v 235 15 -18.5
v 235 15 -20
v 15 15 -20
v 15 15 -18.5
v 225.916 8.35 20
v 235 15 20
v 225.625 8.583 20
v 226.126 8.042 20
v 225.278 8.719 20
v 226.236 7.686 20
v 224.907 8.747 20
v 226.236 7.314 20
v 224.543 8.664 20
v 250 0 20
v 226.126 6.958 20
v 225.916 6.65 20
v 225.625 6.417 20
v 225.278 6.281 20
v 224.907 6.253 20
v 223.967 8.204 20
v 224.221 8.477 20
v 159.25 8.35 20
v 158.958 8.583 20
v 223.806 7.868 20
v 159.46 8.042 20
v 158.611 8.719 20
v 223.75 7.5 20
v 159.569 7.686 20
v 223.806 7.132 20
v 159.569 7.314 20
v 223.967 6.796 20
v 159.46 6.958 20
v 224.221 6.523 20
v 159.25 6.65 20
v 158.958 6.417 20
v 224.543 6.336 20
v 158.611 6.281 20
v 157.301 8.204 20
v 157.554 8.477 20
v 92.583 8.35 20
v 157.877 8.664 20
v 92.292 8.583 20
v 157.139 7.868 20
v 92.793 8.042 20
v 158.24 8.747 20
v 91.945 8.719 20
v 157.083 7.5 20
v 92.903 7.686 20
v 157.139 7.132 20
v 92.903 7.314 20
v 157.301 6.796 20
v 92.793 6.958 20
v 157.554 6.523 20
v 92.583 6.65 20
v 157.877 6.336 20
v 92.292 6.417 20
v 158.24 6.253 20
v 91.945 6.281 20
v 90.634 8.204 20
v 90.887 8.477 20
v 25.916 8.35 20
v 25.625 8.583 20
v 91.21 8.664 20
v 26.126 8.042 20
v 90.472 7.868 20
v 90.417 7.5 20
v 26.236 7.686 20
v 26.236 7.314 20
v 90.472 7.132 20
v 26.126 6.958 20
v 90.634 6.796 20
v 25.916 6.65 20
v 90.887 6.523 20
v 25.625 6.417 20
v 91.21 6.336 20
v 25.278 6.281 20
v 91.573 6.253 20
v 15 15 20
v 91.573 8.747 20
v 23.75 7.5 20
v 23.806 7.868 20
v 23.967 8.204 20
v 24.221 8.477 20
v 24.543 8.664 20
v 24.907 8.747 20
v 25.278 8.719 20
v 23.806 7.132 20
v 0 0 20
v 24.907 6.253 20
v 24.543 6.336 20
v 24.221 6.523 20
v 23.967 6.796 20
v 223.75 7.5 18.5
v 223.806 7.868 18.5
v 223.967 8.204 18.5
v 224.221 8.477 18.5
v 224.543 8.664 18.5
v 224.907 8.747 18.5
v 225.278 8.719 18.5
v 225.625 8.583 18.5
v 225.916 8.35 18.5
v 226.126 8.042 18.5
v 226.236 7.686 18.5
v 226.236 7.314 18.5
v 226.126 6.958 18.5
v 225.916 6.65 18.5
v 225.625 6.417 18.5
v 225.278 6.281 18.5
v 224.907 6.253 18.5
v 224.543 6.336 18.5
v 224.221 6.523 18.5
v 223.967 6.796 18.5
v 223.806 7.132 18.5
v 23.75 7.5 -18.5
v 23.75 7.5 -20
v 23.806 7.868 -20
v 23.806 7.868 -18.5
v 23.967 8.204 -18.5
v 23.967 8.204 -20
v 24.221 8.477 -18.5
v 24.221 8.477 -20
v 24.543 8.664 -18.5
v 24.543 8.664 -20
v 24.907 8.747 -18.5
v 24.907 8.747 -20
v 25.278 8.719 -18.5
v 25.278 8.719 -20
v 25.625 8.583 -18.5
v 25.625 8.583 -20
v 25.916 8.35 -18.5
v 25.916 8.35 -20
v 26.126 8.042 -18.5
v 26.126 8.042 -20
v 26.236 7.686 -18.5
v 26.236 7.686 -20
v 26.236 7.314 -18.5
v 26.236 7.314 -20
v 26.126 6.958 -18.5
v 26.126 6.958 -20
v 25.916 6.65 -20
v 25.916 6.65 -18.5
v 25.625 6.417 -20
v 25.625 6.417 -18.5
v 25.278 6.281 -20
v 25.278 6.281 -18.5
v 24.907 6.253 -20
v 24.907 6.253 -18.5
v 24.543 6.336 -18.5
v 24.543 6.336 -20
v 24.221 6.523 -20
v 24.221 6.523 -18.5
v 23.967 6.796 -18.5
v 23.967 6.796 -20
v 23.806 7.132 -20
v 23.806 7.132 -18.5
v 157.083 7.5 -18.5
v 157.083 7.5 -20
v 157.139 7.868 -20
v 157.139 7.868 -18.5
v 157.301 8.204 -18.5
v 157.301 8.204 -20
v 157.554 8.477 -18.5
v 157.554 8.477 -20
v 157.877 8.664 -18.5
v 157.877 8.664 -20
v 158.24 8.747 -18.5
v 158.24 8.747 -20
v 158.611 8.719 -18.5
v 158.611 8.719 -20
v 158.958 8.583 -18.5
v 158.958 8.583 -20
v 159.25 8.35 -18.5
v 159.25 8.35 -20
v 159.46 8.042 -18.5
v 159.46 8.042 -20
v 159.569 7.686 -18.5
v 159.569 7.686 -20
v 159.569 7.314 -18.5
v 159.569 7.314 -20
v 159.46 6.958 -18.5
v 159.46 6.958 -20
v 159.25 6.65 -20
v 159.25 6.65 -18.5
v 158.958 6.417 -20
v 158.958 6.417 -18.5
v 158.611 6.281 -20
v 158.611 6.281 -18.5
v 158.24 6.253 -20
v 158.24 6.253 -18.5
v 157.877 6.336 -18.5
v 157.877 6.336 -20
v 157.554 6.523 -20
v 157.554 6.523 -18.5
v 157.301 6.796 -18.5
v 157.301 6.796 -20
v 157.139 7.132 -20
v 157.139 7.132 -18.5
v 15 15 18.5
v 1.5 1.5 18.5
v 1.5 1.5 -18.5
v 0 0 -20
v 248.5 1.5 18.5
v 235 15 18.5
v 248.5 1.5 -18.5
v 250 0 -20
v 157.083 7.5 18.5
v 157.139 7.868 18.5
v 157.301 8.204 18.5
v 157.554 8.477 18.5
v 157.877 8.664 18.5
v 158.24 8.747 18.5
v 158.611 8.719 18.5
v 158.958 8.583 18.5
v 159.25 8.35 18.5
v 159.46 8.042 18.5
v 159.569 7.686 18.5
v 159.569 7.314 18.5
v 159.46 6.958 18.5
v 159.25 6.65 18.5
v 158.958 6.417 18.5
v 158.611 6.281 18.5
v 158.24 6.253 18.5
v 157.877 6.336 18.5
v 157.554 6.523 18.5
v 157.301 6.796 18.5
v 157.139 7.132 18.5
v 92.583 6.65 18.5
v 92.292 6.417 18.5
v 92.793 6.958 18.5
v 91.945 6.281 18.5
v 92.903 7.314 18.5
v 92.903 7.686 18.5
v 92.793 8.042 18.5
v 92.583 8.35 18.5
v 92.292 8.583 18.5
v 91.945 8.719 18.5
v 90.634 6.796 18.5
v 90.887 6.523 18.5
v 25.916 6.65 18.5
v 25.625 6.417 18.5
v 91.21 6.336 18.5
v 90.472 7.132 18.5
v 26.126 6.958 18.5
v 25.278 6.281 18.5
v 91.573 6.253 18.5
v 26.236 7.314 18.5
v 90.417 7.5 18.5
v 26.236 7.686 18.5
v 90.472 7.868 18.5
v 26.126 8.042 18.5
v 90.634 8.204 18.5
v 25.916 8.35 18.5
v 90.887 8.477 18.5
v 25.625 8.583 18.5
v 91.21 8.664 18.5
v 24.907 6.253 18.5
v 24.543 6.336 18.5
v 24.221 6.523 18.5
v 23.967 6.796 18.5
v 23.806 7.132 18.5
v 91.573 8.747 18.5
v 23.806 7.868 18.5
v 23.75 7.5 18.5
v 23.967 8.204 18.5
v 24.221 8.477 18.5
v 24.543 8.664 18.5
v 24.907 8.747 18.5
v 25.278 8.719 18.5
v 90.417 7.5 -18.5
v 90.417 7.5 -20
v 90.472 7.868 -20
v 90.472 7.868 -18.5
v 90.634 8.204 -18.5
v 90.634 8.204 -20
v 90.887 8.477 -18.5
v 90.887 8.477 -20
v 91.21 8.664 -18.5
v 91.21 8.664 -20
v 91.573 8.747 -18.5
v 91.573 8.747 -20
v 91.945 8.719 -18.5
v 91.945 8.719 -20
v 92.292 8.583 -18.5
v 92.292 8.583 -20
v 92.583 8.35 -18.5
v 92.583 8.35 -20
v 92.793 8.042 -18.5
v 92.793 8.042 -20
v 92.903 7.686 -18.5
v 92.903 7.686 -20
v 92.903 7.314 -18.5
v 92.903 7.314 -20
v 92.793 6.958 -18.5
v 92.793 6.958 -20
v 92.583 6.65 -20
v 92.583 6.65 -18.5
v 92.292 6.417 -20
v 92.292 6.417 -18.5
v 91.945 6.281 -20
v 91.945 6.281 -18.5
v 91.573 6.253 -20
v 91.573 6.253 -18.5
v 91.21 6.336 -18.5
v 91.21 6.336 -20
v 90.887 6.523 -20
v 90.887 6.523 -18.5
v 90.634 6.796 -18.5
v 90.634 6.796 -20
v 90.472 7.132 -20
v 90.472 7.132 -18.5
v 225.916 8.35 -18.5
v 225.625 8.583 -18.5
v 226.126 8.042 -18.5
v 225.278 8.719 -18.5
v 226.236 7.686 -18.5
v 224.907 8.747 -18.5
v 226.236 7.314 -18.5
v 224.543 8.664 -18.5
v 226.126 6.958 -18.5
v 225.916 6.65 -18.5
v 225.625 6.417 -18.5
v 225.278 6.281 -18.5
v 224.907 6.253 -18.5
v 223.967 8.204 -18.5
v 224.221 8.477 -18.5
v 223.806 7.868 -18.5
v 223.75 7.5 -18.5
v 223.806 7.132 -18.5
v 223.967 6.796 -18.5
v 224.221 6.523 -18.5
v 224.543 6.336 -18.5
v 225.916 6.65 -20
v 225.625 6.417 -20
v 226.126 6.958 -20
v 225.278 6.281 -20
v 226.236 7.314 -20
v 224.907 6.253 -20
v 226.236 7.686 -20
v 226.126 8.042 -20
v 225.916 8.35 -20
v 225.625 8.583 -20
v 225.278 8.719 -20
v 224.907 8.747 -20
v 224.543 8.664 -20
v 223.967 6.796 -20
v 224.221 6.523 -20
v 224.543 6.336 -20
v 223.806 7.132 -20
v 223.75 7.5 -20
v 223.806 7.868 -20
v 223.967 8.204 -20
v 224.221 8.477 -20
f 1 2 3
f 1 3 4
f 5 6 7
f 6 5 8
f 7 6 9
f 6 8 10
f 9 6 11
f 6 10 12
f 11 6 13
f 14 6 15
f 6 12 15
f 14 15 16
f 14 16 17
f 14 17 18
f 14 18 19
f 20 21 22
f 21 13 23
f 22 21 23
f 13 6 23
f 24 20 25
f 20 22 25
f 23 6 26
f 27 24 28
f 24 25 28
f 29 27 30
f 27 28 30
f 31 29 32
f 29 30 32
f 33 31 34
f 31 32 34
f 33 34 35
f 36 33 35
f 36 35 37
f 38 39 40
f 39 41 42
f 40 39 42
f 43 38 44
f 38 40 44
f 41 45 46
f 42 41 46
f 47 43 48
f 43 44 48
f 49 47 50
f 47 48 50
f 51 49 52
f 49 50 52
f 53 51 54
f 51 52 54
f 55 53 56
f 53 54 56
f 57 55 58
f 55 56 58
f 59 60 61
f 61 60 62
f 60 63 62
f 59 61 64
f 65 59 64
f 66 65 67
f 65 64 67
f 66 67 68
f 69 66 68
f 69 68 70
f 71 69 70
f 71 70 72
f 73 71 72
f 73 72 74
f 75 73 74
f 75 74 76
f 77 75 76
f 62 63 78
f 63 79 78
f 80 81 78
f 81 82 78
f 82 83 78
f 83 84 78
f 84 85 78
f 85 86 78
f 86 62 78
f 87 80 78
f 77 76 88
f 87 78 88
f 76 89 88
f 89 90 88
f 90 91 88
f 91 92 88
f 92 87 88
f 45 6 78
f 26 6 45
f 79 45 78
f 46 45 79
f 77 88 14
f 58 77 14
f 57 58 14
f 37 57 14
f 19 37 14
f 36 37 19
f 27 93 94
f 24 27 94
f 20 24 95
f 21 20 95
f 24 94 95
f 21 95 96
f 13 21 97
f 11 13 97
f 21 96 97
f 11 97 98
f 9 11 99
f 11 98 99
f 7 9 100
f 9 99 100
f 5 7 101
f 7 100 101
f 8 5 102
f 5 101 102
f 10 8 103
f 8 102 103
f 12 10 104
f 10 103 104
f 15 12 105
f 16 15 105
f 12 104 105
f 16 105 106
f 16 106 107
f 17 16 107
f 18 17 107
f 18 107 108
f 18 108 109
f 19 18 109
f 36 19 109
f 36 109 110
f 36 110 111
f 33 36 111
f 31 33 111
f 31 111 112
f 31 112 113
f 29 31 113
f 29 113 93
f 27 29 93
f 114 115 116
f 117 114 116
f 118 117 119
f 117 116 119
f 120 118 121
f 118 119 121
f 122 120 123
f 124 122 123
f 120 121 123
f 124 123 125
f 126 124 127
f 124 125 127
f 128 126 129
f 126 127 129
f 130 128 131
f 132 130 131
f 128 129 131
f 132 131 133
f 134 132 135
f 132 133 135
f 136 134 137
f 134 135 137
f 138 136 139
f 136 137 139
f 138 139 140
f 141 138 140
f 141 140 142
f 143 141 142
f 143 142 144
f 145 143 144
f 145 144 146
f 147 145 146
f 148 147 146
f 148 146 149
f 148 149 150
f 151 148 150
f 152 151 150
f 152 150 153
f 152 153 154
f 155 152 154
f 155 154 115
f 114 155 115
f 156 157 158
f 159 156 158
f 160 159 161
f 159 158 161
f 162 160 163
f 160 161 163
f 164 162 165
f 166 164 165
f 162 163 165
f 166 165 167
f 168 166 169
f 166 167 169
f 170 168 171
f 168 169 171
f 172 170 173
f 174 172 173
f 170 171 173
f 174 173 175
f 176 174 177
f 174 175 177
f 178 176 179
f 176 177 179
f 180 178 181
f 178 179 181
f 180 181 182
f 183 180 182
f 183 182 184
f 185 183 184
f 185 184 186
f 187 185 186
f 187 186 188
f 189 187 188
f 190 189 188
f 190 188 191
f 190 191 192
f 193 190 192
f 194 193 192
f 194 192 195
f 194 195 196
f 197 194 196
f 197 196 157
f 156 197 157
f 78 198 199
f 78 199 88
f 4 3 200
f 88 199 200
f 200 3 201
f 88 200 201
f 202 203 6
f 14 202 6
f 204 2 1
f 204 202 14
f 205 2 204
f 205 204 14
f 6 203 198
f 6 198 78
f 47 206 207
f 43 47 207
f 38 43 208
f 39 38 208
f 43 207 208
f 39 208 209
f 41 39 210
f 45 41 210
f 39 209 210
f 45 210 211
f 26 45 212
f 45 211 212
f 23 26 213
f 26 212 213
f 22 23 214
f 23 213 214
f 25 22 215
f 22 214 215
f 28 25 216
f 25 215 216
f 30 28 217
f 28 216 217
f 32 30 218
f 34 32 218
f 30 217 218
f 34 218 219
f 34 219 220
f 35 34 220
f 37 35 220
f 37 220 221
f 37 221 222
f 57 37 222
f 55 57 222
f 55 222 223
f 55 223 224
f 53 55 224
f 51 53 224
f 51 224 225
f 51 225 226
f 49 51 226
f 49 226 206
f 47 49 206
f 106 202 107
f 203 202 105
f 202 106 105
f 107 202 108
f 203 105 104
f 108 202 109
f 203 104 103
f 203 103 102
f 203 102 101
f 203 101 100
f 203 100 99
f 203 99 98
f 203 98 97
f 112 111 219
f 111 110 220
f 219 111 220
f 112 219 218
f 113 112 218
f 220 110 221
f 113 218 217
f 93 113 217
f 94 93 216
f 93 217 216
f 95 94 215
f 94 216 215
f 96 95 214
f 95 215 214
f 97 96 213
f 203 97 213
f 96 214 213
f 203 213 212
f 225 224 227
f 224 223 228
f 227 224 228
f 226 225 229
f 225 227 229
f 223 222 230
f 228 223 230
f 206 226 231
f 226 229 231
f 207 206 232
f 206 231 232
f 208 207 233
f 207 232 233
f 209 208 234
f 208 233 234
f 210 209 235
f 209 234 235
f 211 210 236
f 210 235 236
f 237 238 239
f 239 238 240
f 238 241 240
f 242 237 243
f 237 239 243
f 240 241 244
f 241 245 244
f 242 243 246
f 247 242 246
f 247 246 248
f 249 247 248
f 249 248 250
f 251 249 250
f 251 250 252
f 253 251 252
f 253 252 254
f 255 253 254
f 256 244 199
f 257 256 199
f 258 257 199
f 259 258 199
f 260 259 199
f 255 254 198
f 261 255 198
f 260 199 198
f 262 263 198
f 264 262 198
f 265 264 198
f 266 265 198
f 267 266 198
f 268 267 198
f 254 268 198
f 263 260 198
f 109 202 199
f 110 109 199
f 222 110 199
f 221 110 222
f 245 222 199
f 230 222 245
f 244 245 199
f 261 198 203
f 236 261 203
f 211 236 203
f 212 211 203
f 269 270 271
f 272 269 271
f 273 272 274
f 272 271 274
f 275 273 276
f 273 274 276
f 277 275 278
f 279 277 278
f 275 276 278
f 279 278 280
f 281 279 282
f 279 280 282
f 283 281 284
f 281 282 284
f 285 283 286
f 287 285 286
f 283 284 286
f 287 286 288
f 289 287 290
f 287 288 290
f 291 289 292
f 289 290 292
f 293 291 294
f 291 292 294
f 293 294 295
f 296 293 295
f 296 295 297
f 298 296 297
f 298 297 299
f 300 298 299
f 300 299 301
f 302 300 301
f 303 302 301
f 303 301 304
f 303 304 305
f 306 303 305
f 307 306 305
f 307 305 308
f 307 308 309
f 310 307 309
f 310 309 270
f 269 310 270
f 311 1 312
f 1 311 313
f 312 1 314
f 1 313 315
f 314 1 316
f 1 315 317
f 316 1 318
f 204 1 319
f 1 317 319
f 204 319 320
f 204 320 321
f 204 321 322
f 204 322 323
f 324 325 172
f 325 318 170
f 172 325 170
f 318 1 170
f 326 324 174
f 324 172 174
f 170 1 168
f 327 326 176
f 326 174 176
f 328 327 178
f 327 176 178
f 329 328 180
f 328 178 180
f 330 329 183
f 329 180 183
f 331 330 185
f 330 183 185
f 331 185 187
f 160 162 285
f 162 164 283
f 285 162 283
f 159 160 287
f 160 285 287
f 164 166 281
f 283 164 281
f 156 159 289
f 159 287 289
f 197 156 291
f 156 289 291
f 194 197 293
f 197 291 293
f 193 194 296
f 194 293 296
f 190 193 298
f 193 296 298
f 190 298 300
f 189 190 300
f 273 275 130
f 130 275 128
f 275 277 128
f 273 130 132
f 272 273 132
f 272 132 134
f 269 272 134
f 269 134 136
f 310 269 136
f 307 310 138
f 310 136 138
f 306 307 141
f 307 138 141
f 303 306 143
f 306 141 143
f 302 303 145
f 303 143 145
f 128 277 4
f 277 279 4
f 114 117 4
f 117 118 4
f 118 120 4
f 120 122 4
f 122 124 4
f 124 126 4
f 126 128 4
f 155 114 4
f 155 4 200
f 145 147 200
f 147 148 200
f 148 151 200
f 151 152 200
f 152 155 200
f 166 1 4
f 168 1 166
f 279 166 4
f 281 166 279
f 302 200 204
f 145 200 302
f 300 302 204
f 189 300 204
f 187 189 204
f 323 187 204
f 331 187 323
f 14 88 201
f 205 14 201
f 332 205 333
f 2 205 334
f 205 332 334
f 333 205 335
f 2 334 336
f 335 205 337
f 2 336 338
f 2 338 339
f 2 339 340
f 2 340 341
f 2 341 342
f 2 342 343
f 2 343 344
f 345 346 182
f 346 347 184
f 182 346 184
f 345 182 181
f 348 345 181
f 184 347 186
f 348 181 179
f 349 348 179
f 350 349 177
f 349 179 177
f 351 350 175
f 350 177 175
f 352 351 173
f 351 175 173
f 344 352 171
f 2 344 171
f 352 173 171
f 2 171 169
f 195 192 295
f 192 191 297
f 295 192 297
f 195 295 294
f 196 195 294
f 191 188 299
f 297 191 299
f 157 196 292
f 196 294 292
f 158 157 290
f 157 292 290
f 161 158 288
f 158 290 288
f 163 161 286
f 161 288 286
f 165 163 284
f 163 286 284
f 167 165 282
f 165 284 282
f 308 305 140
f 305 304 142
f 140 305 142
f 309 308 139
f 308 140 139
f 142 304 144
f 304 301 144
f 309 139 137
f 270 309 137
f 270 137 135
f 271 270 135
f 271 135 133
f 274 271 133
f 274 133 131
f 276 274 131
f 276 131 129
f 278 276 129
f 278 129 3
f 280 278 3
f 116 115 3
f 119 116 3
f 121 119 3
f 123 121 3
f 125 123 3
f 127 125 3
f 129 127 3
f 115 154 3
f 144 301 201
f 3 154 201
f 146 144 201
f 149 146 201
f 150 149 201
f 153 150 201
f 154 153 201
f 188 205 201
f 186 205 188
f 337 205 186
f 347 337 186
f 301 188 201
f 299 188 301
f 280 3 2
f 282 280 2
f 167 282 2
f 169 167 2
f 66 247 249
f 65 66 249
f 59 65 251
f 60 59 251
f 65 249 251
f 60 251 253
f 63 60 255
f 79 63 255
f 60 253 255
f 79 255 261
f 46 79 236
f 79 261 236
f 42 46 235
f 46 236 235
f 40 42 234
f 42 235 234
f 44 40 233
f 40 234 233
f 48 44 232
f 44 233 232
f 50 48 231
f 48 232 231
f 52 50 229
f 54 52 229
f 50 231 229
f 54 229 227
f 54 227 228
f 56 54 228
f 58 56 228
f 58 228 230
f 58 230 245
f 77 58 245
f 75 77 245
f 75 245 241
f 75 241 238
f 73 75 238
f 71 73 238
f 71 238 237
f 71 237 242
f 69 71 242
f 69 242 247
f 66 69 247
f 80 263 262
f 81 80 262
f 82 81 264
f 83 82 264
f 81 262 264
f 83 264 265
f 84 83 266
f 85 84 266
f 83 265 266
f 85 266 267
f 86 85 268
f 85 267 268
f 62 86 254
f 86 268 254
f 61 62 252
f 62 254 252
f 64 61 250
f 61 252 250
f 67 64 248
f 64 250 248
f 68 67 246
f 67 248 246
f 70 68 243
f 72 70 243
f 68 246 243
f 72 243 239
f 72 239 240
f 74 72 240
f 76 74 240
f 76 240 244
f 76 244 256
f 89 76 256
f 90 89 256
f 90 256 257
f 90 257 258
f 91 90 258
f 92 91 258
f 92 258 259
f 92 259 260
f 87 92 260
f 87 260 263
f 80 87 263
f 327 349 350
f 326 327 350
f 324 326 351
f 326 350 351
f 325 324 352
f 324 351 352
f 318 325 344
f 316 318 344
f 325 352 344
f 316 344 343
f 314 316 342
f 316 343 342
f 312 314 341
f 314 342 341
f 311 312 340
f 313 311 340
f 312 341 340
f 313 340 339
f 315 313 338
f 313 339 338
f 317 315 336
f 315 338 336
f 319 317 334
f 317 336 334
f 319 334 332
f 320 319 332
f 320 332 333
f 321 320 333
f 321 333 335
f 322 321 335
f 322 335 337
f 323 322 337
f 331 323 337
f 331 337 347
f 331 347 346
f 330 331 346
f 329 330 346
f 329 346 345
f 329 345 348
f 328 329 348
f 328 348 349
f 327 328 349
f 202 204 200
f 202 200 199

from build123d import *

# Parameters (mm, degrees)
SALIENTE_EXTRUIR1_DEPTH = 250
CROQUIS2_R              = 1.25
CORTAR_EXTRUIR1_DEPTH   = 41


with BuildPart() as part:
    # Croquis1 → Saliente-Extruir1 (new body)
    with BuildSketch(Plane(origin=(0, 0, 0), x_dir=(0, 0, -1), z_dir=(1, 0, 0))):
        Polygon((-20, 0), (20, 0), (20, 15), (18.5, 15), (18.5, 1.5), (-18.5, 1.5), (-18.5, 15), (-20, 15), align=None)
    extrude(amount=SALIENTE_EXTRUIR1_DEPTH)

    # Croquis2 → Cortar-Extruir1 (cut, through all)
    with BuildSketch(Plane(origin=(0, 0, -20), x_dir=(-1, 0, 0), z_dir=(0, 0, -1))):
        with Locations((-225, 7.5)):
            Circle(CROQUIS2_R)
        with Locations((-25, 7.5)):
            Circle(CROQUIS2_R)
        with Locations((-158.333333333, 7.5)):
            Circle(CROQUIS2_R)
        with Locations((-91.666666667, 7.5)):
            Circle(CROQUIS2_R)
        Polygon((0, 15), (-15, 15), (0, 0), align=None)
        Polygon((-250, 15), (-235, 15), (-250, 0), align=None)
    extrude(amount=-CORTAR_EXTRUIR1_DEPTH, mode=Mode.SUBTRACT)


solid = part.part
